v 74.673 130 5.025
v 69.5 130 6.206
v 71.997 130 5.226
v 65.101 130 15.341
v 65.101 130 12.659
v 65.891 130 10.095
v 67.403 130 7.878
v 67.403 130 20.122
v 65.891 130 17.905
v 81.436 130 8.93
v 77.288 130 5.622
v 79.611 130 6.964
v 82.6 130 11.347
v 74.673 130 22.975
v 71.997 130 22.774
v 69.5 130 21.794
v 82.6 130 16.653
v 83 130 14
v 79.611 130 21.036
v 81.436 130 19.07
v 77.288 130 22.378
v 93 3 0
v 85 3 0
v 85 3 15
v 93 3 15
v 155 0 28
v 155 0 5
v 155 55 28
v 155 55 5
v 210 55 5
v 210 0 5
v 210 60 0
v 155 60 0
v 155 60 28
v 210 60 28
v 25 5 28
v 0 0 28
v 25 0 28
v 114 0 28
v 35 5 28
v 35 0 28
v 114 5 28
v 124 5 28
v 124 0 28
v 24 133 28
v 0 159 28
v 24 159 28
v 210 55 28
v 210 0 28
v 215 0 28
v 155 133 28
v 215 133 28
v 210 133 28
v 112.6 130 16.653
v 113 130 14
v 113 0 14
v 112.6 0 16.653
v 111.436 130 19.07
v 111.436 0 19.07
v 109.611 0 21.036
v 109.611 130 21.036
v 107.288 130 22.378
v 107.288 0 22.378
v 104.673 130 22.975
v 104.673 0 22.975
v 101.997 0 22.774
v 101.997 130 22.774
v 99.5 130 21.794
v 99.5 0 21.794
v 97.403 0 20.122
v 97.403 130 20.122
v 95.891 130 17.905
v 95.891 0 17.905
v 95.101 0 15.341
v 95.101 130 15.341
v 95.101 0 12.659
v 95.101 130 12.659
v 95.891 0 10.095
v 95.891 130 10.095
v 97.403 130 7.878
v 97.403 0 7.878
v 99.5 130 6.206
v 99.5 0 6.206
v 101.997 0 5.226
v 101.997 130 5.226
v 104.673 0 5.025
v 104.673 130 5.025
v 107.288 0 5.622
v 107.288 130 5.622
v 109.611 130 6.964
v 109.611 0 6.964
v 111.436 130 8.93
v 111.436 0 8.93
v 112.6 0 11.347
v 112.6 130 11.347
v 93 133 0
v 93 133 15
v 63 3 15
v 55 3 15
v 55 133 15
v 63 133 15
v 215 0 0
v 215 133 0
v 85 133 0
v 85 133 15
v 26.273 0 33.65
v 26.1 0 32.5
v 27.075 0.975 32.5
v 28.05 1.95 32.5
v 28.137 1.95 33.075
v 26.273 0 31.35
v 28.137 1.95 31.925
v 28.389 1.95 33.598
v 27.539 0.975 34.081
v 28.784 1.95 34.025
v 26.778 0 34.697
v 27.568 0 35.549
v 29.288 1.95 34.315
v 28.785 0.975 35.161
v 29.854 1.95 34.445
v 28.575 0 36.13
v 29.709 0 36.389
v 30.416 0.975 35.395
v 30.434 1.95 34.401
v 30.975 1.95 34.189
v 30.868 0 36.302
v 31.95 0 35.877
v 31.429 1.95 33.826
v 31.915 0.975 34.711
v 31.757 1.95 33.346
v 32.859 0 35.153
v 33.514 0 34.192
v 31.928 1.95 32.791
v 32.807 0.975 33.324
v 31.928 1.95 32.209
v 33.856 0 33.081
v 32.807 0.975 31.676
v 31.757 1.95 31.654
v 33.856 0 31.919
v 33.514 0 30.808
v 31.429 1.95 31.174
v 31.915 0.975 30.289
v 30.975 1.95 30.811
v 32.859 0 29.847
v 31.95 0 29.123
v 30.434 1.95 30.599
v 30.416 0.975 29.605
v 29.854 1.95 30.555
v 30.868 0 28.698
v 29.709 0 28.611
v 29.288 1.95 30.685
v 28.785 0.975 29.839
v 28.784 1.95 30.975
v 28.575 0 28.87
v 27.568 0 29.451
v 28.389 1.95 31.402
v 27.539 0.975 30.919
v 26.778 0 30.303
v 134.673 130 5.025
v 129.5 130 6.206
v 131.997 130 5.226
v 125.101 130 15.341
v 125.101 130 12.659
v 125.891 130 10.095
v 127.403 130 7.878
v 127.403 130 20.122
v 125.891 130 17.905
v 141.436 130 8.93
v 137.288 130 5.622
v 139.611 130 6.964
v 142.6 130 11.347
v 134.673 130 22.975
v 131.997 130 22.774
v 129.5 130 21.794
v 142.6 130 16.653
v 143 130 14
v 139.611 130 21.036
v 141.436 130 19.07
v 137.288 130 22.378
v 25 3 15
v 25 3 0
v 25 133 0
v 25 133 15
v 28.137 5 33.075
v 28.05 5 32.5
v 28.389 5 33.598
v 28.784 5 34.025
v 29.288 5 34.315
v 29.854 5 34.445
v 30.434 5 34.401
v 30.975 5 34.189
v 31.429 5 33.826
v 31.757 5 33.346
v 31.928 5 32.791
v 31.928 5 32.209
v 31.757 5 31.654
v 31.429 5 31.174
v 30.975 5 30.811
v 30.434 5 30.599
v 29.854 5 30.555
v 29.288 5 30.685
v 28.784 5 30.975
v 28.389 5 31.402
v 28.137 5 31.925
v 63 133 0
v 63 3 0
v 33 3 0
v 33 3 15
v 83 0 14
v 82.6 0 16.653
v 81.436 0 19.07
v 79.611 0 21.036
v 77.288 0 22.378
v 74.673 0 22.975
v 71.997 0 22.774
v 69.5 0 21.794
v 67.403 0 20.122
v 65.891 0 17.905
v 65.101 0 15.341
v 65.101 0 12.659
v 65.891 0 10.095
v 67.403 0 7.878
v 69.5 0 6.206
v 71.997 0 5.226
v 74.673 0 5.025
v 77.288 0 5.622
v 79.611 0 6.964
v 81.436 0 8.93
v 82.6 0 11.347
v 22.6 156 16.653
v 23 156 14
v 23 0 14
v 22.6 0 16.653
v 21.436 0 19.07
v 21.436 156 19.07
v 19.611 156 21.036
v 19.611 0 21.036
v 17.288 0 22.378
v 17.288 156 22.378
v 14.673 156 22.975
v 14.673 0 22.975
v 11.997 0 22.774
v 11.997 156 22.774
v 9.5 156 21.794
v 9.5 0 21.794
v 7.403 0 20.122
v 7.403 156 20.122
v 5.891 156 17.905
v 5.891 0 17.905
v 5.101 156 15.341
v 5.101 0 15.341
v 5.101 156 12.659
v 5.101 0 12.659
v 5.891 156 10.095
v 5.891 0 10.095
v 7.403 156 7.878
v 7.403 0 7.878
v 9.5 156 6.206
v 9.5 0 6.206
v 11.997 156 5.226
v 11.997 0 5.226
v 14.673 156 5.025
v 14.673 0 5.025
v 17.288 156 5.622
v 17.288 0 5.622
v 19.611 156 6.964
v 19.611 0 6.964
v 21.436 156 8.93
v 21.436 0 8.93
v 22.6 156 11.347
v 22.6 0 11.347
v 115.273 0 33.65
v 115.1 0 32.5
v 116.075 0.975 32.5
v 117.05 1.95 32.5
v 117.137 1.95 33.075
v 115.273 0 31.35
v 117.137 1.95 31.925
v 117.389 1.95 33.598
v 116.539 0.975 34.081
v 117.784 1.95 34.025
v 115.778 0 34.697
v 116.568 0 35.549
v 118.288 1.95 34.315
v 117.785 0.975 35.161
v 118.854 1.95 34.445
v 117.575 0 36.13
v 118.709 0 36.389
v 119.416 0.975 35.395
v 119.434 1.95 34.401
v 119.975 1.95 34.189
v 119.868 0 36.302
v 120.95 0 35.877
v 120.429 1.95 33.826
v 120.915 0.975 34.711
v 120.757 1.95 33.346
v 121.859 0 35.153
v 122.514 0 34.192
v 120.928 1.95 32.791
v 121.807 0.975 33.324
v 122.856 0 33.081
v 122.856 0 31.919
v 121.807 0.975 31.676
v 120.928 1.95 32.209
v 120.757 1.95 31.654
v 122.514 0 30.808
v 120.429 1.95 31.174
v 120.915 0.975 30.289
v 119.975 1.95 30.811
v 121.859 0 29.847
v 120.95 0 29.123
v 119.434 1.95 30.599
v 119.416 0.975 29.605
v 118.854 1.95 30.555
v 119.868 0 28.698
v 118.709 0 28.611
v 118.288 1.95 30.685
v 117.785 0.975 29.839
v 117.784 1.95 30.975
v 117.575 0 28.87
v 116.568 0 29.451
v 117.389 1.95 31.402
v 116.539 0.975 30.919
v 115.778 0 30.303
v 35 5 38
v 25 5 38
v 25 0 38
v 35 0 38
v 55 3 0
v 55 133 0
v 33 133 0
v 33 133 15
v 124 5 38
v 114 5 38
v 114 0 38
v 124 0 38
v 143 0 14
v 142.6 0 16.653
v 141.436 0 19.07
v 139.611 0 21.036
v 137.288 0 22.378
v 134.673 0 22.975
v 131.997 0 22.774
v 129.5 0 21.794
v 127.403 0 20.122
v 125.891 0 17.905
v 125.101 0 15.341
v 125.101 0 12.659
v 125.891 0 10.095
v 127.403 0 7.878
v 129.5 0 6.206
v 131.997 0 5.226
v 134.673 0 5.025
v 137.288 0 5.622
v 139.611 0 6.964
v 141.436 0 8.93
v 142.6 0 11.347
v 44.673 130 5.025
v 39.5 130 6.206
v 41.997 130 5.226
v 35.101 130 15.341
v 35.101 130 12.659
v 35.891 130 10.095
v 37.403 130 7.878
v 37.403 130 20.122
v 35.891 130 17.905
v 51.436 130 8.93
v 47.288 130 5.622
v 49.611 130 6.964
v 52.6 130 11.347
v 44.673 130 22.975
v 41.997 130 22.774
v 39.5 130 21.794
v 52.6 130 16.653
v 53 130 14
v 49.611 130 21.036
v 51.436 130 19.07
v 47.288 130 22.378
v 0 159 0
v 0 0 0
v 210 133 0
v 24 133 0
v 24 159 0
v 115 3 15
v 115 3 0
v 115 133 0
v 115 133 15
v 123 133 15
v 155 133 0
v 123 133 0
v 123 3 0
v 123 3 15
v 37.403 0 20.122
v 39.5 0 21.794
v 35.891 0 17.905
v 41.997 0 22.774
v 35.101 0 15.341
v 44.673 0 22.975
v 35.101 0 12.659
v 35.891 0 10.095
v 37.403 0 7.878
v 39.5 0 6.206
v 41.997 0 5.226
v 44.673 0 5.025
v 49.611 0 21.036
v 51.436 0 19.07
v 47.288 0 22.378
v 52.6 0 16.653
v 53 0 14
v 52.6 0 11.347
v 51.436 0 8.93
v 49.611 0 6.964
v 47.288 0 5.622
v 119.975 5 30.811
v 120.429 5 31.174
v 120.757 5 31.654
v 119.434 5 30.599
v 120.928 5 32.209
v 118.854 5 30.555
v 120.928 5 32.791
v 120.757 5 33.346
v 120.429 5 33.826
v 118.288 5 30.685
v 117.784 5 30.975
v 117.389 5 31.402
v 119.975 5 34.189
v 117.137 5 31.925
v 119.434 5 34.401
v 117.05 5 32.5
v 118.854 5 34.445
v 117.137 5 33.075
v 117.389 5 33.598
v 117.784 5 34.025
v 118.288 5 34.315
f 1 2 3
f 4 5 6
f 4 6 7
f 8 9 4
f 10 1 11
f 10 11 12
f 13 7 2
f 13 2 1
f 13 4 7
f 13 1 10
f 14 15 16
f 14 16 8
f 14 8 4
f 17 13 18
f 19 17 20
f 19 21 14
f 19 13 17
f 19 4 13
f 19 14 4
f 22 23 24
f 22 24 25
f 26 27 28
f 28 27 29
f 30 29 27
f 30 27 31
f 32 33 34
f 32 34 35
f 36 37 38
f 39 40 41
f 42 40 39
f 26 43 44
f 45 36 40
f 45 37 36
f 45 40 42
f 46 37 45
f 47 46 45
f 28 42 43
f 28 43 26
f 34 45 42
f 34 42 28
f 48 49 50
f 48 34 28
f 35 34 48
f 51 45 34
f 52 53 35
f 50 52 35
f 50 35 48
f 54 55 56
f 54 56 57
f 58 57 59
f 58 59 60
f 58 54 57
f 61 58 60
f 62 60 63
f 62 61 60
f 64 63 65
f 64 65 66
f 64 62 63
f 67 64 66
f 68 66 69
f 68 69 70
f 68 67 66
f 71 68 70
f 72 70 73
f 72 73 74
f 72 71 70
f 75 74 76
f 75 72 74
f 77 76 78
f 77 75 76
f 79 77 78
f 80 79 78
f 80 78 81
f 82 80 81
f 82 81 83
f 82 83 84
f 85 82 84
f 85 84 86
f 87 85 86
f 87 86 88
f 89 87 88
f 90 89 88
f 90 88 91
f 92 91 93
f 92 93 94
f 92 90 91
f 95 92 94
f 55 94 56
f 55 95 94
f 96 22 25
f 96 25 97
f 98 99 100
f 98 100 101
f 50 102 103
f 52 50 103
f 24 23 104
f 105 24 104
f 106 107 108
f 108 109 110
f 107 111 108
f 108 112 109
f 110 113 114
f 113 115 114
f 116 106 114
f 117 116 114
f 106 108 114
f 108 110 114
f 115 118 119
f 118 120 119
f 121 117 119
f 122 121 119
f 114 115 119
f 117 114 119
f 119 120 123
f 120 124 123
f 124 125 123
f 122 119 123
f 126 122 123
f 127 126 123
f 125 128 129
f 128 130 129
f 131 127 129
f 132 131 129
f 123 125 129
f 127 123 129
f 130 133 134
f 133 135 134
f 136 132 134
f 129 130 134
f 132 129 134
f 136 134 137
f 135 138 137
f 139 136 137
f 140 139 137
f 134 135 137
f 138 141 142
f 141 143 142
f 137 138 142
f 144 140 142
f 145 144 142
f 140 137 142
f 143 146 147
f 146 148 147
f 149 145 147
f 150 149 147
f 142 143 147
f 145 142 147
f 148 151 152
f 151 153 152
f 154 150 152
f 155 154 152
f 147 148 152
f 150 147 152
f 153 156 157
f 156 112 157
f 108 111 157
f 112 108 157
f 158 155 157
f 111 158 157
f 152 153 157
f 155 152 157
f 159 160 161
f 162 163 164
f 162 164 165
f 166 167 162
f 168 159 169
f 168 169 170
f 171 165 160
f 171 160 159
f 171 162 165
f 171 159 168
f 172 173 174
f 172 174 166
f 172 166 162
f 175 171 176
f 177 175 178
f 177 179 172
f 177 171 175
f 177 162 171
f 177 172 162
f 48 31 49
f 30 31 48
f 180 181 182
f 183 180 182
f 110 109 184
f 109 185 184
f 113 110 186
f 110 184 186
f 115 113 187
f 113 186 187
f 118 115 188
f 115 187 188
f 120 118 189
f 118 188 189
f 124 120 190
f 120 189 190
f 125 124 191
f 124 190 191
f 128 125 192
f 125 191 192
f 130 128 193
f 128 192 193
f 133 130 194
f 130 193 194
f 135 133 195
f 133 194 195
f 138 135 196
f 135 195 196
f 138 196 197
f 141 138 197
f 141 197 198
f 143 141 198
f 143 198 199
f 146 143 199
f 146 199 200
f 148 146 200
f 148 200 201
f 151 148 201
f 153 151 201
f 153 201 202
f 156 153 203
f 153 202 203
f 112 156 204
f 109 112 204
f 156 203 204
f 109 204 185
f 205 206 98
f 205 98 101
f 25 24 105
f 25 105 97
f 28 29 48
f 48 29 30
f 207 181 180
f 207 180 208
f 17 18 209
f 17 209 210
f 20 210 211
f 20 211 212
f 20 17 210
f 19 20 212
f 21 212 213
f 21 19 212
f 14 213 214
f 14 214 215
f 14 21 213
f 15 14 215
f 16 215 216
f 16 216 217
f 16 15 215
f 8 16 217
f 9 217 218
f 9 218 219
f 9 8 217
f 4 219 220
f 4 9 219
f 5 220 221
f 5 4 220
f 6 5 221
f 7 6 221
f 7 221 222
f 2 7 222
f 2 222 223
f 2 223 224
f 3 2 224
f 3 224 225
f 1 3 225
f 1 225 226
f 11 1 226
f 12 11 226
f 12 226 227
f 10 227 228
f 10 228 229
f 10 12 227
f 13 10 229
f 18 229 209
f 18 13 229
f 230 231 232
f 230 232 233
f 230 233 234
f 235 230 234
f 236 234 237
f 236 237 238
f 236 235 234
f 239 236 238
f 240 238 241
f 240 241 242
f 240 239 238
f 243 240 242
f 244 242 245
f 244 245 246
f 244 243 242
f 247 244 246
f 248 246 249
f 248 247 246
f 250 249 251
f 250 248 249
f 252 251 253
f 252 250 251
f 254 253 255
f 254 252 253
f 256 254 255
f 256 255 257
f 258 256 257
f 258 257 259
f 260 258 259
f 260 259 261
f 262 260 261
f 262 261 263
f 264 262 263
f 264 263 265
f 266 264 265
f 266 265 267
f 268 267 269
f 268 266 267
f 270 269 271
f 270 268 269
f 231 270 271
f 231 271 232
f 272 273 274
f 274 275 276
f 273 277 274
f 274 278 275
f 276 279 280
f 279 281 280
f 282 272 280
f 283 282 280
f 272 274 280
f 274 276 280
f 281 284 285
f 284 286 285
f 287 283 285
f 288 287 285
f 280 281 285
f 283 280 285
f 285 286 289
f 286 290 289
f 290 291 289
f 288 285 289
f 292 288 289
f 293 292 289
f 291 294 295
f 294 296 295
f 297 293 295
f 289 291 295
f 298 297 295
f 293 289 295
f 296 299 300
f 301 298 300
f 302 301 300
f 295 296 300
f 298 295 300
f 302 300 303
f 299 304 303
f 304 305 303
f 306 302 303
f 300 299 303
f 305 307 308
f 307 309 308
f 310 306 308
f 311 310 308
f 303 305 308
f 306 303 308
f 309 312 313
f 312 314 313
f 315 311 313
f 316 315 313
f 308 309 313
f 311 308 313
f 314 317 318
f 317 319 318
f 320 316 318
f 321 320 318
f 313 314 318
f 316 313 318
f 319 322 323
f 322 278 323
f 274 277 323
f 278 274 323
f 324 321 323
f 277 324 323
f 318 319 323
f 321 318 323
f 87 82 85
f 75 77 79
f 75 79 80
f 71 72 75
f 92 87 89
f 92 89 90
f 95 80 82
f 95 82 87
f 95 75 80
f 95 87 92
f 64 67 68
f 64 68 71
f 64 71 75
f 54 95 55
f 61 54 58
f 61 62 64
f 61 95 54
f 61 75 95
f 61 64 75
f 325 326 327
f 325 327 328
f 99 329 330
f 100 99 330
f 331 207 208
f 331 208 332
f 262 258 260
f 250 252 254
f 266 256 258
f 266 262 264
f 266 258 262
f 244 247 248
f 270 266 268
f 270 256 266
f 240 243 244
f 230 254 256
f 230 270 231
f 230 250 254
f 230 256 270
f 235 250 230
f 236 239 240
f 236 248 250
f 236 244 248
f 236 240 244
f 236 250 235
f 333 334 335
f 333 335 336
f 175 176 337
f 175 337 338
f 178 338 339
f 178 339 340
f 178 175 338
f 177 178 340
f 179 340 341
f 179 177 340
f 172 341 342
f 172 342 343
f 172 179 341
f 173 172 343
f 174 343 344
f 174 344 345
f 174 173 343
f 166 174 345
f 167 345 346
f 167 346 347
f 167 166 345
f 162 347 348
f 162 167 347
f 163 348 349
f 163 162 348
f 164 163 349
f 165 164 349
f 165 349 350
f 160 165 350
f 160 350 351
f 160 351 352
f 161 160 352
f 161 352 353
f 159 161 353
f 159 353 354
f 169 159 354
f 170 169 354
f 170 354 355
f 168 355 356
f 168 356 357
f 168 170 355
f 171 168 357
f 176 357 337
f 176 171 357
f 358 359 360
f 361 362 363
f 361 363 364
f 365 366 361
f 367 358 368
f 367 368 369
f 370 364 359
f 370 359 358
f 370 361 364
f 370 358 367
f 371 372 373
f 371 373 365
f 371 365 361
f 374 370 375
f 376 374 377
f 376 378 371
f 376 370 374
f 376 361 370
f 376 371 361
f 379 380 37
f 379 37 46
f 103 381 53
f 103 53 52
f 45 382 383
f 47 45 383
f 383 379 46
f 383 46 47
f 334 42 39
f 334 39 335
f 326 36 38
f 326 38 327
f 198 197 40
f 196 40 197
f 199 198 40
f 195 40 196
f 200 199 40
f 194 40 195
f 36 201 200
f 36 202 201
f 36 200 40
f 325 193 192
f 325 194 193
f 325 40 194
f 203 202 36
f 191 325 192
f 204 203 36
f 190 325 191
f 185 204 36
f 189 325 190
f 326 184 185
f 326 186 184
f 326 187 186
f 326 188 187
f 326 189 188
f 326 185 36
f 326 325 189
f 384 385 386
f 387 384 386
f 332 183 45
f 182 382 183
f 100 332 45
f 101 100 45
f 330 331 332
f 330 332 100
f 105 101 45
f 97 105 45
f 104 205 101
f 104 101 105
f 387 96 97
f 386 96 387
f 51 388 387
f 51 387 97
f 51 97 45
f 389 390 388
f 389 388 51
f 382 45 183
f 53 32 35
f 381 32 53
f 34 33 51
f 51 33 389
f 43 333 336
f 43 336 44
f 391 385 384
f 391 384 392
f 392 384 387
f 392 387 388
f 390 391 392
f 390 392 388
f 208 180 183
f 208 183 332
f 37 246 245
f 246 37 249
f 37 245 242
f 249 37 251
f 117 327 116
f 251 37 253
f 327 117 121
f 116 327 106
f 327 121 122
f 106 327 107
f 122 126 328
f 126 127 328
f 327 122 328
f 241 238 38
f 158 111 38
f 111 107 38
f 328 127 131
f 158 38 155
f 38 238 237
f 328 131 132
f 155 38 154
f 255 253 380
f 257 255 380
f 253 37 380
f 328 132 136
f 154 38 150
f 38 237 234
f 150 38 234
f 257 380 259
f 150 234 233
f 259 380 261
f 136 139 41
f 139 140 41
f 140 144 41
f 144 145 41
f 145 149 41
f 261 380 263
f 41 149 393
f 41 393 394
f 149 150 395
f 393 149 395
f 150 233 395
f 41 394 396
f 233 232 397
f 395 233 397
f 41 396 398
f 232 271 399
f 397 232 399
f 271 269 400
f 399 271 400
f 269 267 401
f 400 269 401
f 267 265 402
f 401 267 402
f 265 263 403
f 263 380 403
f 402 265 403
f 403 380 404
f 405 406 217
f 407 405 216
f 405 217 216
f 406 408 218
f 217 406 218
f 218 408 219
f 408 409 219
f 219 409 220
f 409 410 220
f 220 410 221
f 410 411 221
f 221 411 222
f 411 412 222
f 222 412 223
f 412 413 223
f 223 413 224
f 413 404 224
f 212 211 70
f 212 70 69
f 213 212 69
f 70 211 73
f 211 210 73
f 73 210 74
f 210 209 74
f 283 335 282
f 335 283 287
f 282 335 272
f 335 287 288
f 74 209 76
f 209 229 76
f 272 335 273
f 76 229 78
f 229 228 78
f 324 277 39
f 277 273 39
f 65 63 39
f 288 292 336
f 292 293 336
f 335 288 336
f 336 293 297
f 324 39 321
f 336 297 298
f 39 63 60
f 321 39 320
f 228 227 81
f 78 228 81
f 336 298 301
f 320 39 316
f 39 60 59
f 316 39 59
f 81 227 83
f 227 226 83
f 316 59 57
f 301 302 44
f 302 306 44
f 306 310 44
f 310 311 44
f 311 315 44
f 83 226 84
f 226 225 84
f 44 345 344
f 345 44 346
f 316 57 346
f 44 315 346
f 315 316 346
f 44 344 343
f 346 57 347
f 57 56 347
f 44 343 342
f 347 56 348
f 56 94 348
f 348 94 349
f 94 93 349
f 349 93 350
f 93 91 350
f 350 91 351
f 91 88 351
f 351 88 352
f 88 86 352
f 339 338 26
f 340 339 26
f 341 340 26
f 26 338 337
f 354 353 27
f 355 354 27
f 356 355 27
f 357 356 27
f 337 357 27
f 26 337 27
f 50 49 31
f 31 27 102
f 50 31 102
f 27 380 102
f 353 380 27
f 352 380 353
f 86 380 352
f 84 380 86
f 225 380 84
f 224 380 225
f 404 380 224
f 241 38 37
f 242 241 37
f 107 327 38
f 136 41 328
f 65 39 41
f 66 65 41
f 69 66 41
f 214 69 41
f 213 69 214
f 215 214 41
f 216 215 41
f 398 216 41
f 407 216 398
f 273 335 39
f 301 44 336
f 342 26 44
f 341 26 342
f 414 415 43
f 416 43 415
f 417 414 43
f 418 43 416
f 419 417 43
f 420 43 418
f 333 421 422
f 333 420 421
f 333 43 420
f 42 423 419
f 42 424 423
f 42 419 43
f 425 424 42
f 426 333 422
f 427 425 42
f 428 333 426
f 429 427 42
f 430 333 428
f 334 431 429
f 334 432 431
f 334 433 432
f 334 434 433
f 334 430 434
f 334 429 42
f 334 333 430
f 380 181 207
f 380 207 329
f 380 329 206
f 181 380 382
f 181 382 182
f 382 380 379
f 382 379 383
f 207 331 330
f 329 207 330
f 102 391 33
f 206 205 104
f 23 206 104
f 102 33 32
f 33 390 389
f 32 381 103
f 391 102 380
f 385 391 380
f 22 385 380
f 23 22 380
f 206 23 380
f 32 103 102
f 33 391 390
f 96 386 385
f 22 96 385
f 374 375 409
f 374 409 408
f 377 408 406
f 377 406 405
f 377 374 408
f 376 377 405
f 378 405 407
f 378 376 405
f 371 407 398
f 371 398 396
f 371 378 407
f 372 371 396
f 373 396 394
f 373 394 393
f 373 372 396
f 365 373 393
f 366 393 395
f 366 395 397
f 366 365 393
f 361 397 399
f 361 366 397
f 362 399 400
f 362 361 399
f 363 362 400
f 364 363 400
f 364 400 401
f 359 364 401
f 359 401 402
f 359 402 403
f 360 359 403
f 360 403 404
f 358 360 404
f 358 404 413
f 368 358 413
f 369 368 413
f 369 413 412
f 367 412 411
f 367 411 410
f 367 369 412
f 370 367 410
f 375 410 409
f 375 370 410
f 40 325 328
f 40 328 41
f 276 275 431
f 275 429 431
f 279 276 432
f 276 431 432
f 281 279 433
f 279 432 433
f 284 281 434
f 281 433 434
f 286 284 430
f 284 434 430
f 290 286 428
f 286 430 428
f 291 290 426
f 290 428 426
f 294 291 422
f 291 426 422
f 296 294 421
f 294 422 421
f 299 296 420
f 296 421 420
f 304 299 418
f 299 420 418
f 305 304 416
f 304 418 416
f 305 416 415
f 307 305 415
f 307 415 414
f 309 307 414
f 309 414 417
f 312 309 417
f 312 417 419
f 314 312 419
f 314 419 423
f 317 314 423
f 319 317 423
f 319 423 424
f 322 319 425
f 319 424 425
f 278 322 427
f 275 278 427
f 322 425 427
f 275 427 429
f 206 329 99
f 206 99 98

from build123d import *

# Parameters (mm, degrees)
CYLINDER004_R     = 9
CYLINDER004_DEPTH = 130
CYLINDER003_R     = 9
CYLINDER003_DEPTH = 130
CYLINDER002_R     = 9
CYLINDER002_DEPTH = 130
CYLINDER001_R     = 9
CYLINDER001_DEPTH = 130
CYLINDER_R        = 9
CYLINDER_DEPTH    = 156
BOX007_W          = 8
BOX007_H          = 165
BOX007_DEPTH      = 15
BOX006_W          = 8
BOX006_H          = 165
BOX006_DEPTH      = 15
BOX005_W          = 8
BOX005_H          = 165
BOX005_DEPTH      = 15
BOX004_W          = 8
BOX004_H          = 165
BOX004_DEPTH      = 15
BOX003_W          = 197
BOX003_H          = 103
BOX003_DEPTH      = 33
BOX002_W          = 55
BOX002_H          = 103
BOX002_DEPTH      = 34
BOX001_W          = 55
BOX001_H          = 55
BOX001_DEPTH      = 23
BOX_W             = 215
BOX_H             = 159
BOX_DEPTH         = 28
PAD_DEPTH         = 5
HOLE_D            = 3.9
HOLE_DEPTH        = 25
HOLE_CSINK_D      = 7.8
HOLE_CSINK_ANGLE  = 90


with BuildPart() as cylinder004:
    # Cylinder004 → Cylinder004 (new body)
    with BuildSketch(Plane(origin=(134, 130, 14), x_dir=(1, 0, 0), z_dir=(0, -1, 0))):
        Circle(CYLINDER004_R)
    extrude(amount=CYLINDER004_DEPTH)


with BuildPart() as cylinder003:
    # Cylinder003 → Cylinder003 (new body)
    with BuildSketch(Plane(origin=(104, 130, 14), x_dir=(1, 0, 0), z_dir=(0, -1, 0))):
        Circle(CYLINDER003_R)
    extrude(amount=CYLINDER003_DEPTH)


with BuildPart() as cylinder002:
    # Cylinder002 → Cylinder002 (new body)
    with BuildSketch(Plane(origin=(74, 130, 14), x_dir=(1, 0, 0), z_dir=(0, -1, 0))):
        Circle(CYLINDER002_R)
    extrude(amount=CYLINDER002_DEPTH)


with BuildPart() as cylinder001:
    # Cylinder001 → Cylinder001 (new body)
    with BuildSketch(Plane(origin=(44, 130, 14), x_dir=(1, 0, 0), z_dir=(0, -1, 0))):
        Circle(CYLINDER001_R)
    extrude(amount=CYLINDER001_DEPTH)


with BuildPart() as cylinder:
    # Cylinder → Cylinder (new body)
    with BuildSketch(Plane(origin=(14, 156, 14), x_dir=(1, 0, 0), z_dir=(0, -1, 0))):
        Circle(CYLINDER_R)
    extrude(amount=CYLINDER_DEPTH)


with BuildPart() as cube007:
    # Box007 → Box007 (new body)
    with BuildSketch(Plane(origin=(115, 3, 0), x_dir=(1, 0, 0), z_dir=(0, 0, 1))):
        with Locations((4, 82.5)):
            Rectangle(BOX007_W, BOX007_H)
    extrude(amount=BOX007_DEPTH)


with BuildPart() as cube006:
    # Box006 → Box006 (new body)
    with BuildSketch(Plane(origin=(85, 3, 0), x_dir=(1, 0, 0), z_dir=(0, 0, 1))):
        with Locations((4, 82.5)):
            Rectangle(BOX006_W, BOX006_H)
    extrude(amount=BOX006_DEPTH)


with BuildPart() as cube005:
    # Box005 → Box005 (new body)
    with BuildSketch(Plane(origin=(55, 3, 0), x_dir=(1, 0, 0), z_dir=(0, 0, 1))):
        with Locations((4, 82.5)):
            Rectangle(BOX005_W, BOX005_H)
    extrude(amount=BOX005_DEPTH)


with BuildPart() as cube004:
    # Box004 → Box004 (new body)
    with BuildSketch(Plane(origin=(25, 3, 0), x_dir=(1, 0, 0), z_dir=(0, 0, 1))):
        with Locations((4, 82.5)):
            Rectangle(BOX004_W, BOX004_H)
    extrude(amount=BOX004_DEPTH)


with BuildPart() as cube003:
    # Box003 → Box003 (new body)
    with BuildSketch(Plane(origin=(24, 133, -3), x_dir=(1, 0, 0), z_dir=(0, 0, 1))):
        with Locations((98.5, 51.5)):
            Rectangle(BOX003_W, BOX003_H)
    extrude(amount=BOX003_DEPTH)


with BuildPart() as cube002:
    # Box002 → Box002 (new body)
    with BuildSketch(Plane(origin=(155, 60, -3), x_dir=(1, 0, 0), z_dir=(0, 0, 1))):
        with Locations((27.5, 51.5)):
            Rectangle(BOX002_W, BOX002_H)
    extrude(amount=BOX002_DEPTH)


with BuildPart() as cube001:
    # Box001 → Box001 (new body)
    with BuildSketch(Plane(origin=(155, 0, 5), x_dir=(1, 0, 0), z_dir=(0, 0, 1))):
        with Locations((27.5, 27.5)):
            Rectangle(BOX001_W, BOX001_H)
    extrude(amount=BOX001_DEPTH)


with BuildPart() as cut011:
    # Box → Box (new body)
    with BuildSketch(Plane.XY):
        with Locations((107.5, 79.5)):
            Rectangle(BOX_W, BOX_H)
    extrude(amount=BOX_DEPTH)

    # Cut: cut Cube001
    add(cube001.part, mode=Mode.SUBTRACT)

    # Cut001: cut Cube002
    add(cube002.part, mode=Mode.SUBTRACT)

    # Cut002: cut Cube003
    add(cube003.part, mode=Mode.SUBTRACT)

    # Cut003: cut Cube004
    add(cube004.part, mode=Mode.SUBTRACT)

    # Cut004: cut Cube005
    add(cube005.part, mode=Mode.SUBTRACT)

    # Cut005: cut Cube006
    add(cube006.part, mode=Mode.SUBTRACT)

    # Cut006: cut Cube007
    add(cube007.part, mode=Mode.SUBTRACT)

    # Cut007: cut Cylinder
    add(cylinder.part, mode=Mode.SUBTRACT)

    # Cut008: cut Cylinder001
    add(cylinder001.part, mode=Mode.SUBTRACT)

    # Cut009: cut Cylinder002
    add(cylinder002.part, mode=Mode.SUBTRACT)

    # Cut010: cut Cylinder003
    add(cylinder003.part, mode=Mode.SUBTRACT)

    # Cut011: cut Cylinder004
    add(cylinder004.part, mode=Mode.SUBTRACT)


with BuildPart() as fusion:
    # Sketch → Pad (new body)
    with BuildSketch(Plane.XZ):
        Polygon((25, 38), (35, 38), (35, 28), (114, 28), (114, 38), (124, 38), (124, 27), (114, 27), (35, 27), (25, 27), align=None)
    extrude(amount=PAD_DEPTH)

    # Hole
    with Locations(Plane.XZ.offset(5)):
        with Locations((30, 32.5), (119, 32.5)):
            CounterSinkHole(HOLE_D / 2, HOLE_CSINK_D / 2, depth=HOLE_DEPTH, counter_sink_angle=HOLE_CSINK_ANGLE)


with BuildPart() as fusion_1:
    # Body placement: moved
    add(fusion.part.moved(Location((0, 5, 0))))

    # Fusion: union Cut011
    add(cut011.part)


solid = fusion_1.part
